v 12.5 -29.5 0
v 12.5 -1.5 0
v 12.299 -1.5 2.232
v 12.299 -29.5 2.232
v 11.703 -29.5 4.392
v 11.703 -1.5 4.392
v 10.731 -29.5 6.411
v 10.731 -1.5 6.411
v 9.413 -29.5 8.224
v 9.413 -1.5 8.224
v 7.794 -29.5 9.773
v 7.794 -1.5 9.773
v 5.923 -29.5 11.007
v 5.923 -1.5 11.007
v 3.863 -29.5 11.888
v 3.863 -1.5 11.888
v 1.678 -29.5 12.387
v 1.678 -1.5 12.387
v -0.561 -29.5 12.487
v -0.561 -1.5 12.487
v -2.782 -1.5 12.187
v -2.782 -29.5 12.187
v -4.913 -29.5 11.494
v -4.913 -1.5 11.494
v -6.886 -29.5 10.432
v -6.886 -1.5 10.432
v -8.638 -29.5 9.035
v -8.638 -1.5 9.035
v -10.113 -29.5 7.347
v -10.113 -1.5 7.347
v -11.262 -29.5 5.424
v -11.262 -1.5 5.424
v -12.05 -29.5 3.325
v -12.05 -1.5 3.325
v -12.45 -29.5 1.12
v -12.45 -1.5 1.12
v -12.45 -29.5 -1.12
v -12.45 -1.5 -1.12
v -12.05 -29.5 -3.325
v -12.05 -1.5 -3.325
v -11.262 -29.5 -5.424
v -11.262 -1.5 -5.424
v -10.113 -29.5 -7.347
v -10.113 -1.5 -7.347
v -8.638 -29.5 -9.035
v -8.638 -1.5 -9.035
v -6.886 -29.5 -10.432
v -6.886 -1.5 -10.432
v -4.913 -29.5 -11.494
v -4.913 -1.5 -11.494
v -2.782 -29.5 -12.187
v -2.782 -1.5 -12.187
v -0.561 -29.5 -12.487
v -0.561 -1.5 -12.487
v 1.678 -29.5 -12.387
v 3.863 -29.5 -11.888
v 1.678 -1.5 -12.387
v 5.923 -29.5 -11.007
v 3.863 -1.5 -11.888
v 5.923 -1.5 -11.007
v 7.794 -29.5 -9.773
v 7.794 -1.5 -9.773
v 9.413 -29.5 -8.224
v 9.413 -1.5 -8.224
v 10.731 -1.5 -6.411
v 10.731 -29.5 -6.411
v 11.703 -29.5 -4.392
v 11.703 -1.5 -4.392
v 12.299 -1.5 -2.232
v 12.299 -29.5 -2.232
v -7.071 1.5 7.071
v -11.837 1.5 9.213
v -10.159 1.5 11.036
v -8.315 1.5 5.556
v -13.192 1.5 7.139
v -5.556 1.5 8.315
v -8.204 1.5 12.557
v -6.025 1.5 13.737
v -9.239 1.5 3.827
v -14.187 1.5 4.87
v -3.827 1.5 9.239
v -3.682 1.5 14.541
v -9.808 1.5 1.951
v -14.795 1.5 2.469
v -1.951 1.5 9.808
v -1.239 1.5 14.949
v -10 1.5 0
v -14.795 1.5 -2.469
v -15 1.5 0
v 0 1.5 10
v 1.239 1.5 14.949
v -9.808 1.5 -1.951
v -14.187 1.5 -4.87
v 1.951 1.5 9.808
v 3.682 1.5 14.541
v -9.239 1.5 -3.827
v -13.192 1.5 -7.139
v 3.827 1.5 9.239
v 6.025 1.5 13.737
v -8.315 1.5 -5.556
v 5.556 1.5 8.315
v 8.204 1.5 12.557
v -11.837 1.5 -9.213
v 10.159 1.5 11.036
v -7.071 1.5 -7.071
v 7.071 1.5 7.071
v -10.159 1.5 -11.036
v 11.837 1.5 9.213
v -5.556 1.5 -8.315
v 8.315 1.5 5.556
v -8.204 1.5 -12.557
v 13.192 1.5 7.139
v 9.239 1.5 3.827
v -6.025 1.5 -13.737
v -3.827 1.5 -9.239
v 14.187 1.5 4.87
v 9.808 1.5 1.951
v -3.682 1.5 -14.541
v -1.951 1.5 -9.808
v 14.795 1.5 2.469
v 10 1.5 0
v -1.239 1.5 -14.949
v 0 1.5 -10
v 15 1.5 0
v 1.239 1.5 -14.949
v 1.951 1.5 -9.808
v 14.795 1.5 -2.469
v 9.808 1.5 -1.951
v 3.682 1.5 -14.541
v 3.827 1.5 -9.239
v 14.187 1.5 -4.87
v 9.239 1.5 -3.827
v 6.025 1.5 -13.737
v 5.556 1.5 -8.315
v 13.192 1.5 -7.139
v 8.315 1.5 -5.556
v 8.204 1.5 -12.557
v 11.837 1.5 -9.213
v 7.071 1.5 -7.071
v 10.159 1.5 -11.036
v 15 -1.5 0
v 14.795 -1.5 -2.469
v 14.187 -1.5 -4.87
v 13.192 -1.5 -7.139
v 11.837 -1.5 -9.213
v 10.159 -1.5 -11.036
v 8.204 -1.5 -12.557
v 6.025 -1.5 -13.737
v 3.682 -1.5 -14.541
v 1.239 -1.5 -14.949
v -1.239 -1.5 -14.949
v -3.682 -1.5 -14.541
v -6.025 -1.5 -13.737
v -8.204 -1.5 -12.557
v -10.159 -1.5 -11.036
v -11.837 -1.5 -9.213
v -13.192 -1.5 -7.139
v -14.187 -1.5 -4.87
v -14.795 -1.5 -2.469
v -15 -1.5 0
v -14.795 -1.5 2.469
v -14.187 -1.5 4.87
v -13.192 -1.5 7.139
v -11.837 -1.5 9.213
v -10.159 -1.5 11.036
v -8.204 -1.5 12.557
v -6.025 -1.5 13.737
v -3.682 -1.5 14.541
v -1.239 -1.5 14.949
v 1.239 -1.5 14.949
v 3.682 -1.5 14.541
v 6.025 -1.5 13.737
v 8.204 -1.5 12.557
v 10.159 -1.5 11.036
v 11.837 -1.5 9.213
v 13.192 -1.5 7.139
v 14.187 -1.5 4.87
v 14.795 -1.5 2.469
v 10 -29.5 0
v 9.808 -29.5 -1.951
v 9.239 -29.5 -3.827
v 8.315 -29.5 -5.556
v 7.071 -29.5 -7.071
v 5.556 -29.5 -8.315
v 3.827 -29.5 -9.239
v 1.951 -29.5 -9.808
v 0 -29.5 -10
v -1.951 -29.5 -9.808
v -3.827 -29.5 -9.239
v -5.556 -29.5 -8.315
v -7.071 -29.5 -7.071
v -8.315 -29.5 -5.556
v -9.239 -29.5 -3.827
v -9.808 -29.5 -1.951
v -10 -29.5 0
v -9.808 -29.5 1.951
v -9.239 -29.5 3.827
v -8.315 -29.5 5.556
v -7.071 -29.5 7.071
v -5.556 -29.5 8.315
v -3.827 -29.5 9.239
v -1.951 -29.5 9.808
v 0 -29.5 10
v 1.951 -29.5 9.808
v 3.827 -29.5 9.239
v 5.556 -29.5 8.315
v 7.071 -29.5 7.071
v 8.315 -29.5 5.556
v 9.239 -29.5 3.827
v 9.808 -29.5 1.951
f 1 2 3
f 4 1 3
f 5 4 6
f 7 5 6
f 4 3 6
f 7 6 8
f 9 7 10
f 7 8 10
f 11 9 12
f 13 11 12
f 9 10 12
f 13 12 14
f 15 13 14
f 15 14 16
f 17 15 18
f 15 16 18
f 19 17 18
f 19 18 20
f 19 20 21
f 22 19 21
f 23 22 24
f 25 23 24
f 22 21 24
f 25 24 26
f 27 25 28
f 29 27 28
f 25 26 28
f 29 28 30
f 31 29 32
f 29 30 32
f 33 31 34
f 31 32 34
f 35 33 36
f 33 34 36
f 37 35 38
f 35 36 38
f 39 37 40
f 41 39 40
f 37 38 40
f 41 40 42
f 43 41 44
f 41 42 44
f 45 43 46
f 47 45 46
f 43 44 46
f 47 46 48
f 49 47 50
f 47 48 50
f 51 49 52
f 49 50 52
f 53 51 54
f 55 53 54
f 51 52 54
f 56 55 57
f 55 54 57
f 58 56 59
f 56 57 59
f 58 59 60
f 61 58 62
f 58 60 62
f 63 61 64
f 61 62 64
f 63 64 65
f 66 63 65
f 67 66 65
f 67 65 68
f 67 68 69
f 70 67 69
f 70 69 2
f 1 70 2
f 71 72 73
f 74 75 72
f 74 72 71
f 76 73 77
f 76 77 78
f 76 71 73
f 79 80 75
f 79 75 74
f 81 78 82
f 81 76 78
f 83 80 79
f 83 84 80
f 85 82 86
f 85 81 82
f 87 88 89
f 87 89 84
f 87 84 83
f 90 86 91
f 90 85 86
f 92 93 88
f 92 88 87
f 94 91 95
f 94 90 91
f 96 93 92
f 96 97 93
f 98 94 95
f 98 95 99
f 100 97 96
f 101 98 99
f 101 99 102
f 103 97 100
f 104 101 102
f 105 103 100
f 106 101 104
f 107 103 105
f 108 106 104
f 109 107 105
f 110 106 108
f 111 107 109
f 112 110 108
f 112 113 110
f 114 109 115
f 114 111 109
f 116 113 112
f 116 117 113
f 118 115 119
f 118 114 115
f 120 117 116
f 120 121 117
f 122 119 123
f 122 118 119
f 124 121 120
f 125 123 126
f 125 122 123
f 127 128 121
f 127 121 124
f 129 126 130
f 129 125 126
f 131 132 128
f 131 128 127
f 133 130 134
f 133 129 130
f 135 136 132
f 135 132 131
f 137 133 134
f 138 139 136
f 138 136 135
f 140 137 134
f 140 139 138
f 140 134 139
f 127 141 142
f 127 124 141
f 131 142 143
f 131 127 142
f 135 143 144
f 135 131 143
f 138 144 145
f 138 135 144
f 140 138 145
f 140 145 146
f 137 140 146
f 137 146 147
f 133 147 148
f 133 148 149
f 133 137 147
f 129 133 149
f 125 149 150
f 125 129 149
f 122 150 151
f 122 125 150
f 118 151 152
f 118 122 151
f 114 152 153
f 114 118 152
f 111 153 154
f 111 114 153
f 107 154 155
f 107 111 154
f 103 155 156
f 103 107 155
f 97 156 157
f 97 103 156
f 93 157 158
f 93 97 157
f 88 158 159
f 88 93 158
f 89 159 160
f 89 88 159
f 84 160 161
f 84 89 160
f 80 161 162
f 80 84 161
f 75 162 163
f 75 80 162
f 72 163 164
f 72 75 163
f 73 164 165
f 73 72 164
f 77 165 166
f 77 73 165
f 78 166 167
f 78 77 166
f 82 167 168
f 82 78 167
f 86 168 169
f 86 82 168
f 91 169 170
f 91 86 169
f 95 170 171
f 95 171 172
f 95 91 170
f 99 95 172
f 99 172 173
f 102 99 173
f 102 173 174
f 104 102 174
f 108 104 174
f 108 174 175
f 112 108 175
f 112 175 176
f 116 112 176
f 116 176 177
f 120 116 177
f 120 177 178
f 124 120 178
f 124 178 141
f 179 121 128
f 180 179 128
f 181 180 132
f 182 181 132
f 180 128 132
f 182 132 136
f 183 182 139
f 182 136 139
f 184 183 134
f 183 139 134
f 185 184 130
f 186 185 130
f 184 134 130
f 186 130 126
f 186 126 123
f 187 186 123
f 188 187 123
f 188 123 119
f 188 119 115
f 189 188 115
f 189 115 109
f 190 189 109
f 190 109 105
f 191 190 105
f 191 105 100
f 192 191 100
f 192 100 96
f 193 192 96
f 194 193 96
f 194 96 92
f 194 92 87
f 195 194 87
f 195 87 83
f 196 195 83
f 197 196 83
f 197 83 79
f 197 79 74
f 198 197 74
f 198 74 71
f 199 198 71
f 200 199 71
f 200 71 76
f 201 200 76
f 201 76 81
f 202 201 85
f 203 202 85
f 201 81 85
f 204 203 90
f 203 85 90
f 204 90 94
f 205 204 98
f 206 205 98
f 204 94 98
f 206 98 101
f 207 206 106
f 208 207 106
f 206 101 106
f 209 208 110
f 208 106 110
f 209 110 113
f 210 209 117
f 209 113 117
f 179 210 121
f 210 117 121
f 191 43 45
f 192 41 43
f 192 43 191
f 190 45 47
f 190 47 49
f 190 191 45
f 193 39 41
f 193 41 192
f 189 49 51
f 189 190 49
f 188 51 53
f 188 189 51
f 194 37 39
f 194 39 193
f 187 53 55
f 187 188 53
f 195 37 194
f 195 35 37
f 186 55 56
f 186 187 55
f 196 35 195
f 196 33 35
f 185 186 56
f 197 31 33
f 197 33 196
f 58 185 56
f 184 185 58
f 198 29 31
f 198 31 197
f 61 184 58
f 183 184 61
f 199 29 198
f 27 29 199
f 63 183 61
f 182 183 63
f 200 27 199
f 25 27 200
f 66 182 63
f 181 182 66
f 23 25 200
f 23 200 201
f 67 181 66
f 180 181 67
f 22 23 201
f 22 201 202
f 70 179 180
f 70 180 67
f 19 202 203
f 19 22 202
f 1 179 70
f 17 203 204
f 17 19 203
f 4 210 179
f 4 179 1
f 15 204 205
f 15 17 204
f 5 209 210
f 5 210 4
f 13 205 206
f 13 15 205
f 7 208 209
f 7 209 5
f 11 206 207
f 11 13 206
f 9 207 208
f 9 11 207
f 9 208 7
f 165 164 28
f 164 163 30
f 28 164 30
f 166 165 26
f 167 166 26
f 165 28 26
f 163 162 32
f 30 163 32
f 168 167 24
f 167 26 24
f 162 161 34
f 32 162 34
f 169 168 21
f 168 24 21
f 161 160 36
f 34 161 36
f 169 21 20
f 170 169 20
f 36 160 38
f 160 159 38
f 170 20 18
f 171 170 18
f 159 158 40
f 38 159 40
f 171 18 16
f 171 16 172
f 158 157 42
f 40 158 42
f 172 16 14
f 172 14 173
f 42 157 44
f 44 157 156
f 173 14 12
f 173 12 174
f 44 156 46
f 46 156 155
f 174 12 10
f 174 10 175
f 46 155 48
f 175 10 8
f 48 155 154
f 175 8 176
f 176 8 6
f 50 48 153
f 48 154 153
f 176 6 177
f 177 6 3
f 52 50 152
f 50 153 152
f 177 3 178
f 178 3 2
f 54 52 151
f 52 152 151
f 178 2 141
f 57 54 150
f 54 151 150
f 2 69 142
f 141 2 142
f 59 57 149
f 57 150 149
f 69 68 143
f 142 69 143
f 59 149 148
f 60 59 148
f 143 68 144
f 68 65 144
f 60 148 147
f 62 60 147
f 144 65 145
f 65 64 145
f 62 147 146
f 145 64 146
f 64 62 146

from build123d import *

# Parameters (mm, degrees)
SKETCH1_R           = 15
BOSS_EXTRUDE1_DEPTH = 1.5
SKETCH2_R           = 12.5
BOSS_EXTRUDE2_DEPTH = 28
SKETCH3_R           = 10
CUT_EXTRUDE1_DEPTH  = 32


with BuildPart() as part:
    # Sketch1 → Boss-Extrude1 (new body, symmetric)
    with BuildSketch(Plane(origin=(0, 0, 0), x_dir=(1, 0, 0), z_dir=(0, 1, 0))):
        Circle(SKETCH1_R)
    extrude(amount=BOSS_EXTRUDE1_DEPTH, both=True)

    # Sketch2 → Boss-Extrude2 (add)
    with BuildSketch(Plane.XZ.offset(1.5)):
        Circle(SKETCH2_R)
    extrude(amount=BOSS_EXTRUDE2_DEPTH)

    # Sketch3 → Cut-Extrude1 (cut, through all)
    with BuildSketch(Plane(origin=(0, 1.5, 0), x_dir=(1, 0, 0), z_dir=(0, 1, 0))):
        Circle(SKETCH3_R)
    extrude(amount=-CUT_EXTRUDE1_DEPTH, mode=Mode.SUBTRACT)


solid = part.part
